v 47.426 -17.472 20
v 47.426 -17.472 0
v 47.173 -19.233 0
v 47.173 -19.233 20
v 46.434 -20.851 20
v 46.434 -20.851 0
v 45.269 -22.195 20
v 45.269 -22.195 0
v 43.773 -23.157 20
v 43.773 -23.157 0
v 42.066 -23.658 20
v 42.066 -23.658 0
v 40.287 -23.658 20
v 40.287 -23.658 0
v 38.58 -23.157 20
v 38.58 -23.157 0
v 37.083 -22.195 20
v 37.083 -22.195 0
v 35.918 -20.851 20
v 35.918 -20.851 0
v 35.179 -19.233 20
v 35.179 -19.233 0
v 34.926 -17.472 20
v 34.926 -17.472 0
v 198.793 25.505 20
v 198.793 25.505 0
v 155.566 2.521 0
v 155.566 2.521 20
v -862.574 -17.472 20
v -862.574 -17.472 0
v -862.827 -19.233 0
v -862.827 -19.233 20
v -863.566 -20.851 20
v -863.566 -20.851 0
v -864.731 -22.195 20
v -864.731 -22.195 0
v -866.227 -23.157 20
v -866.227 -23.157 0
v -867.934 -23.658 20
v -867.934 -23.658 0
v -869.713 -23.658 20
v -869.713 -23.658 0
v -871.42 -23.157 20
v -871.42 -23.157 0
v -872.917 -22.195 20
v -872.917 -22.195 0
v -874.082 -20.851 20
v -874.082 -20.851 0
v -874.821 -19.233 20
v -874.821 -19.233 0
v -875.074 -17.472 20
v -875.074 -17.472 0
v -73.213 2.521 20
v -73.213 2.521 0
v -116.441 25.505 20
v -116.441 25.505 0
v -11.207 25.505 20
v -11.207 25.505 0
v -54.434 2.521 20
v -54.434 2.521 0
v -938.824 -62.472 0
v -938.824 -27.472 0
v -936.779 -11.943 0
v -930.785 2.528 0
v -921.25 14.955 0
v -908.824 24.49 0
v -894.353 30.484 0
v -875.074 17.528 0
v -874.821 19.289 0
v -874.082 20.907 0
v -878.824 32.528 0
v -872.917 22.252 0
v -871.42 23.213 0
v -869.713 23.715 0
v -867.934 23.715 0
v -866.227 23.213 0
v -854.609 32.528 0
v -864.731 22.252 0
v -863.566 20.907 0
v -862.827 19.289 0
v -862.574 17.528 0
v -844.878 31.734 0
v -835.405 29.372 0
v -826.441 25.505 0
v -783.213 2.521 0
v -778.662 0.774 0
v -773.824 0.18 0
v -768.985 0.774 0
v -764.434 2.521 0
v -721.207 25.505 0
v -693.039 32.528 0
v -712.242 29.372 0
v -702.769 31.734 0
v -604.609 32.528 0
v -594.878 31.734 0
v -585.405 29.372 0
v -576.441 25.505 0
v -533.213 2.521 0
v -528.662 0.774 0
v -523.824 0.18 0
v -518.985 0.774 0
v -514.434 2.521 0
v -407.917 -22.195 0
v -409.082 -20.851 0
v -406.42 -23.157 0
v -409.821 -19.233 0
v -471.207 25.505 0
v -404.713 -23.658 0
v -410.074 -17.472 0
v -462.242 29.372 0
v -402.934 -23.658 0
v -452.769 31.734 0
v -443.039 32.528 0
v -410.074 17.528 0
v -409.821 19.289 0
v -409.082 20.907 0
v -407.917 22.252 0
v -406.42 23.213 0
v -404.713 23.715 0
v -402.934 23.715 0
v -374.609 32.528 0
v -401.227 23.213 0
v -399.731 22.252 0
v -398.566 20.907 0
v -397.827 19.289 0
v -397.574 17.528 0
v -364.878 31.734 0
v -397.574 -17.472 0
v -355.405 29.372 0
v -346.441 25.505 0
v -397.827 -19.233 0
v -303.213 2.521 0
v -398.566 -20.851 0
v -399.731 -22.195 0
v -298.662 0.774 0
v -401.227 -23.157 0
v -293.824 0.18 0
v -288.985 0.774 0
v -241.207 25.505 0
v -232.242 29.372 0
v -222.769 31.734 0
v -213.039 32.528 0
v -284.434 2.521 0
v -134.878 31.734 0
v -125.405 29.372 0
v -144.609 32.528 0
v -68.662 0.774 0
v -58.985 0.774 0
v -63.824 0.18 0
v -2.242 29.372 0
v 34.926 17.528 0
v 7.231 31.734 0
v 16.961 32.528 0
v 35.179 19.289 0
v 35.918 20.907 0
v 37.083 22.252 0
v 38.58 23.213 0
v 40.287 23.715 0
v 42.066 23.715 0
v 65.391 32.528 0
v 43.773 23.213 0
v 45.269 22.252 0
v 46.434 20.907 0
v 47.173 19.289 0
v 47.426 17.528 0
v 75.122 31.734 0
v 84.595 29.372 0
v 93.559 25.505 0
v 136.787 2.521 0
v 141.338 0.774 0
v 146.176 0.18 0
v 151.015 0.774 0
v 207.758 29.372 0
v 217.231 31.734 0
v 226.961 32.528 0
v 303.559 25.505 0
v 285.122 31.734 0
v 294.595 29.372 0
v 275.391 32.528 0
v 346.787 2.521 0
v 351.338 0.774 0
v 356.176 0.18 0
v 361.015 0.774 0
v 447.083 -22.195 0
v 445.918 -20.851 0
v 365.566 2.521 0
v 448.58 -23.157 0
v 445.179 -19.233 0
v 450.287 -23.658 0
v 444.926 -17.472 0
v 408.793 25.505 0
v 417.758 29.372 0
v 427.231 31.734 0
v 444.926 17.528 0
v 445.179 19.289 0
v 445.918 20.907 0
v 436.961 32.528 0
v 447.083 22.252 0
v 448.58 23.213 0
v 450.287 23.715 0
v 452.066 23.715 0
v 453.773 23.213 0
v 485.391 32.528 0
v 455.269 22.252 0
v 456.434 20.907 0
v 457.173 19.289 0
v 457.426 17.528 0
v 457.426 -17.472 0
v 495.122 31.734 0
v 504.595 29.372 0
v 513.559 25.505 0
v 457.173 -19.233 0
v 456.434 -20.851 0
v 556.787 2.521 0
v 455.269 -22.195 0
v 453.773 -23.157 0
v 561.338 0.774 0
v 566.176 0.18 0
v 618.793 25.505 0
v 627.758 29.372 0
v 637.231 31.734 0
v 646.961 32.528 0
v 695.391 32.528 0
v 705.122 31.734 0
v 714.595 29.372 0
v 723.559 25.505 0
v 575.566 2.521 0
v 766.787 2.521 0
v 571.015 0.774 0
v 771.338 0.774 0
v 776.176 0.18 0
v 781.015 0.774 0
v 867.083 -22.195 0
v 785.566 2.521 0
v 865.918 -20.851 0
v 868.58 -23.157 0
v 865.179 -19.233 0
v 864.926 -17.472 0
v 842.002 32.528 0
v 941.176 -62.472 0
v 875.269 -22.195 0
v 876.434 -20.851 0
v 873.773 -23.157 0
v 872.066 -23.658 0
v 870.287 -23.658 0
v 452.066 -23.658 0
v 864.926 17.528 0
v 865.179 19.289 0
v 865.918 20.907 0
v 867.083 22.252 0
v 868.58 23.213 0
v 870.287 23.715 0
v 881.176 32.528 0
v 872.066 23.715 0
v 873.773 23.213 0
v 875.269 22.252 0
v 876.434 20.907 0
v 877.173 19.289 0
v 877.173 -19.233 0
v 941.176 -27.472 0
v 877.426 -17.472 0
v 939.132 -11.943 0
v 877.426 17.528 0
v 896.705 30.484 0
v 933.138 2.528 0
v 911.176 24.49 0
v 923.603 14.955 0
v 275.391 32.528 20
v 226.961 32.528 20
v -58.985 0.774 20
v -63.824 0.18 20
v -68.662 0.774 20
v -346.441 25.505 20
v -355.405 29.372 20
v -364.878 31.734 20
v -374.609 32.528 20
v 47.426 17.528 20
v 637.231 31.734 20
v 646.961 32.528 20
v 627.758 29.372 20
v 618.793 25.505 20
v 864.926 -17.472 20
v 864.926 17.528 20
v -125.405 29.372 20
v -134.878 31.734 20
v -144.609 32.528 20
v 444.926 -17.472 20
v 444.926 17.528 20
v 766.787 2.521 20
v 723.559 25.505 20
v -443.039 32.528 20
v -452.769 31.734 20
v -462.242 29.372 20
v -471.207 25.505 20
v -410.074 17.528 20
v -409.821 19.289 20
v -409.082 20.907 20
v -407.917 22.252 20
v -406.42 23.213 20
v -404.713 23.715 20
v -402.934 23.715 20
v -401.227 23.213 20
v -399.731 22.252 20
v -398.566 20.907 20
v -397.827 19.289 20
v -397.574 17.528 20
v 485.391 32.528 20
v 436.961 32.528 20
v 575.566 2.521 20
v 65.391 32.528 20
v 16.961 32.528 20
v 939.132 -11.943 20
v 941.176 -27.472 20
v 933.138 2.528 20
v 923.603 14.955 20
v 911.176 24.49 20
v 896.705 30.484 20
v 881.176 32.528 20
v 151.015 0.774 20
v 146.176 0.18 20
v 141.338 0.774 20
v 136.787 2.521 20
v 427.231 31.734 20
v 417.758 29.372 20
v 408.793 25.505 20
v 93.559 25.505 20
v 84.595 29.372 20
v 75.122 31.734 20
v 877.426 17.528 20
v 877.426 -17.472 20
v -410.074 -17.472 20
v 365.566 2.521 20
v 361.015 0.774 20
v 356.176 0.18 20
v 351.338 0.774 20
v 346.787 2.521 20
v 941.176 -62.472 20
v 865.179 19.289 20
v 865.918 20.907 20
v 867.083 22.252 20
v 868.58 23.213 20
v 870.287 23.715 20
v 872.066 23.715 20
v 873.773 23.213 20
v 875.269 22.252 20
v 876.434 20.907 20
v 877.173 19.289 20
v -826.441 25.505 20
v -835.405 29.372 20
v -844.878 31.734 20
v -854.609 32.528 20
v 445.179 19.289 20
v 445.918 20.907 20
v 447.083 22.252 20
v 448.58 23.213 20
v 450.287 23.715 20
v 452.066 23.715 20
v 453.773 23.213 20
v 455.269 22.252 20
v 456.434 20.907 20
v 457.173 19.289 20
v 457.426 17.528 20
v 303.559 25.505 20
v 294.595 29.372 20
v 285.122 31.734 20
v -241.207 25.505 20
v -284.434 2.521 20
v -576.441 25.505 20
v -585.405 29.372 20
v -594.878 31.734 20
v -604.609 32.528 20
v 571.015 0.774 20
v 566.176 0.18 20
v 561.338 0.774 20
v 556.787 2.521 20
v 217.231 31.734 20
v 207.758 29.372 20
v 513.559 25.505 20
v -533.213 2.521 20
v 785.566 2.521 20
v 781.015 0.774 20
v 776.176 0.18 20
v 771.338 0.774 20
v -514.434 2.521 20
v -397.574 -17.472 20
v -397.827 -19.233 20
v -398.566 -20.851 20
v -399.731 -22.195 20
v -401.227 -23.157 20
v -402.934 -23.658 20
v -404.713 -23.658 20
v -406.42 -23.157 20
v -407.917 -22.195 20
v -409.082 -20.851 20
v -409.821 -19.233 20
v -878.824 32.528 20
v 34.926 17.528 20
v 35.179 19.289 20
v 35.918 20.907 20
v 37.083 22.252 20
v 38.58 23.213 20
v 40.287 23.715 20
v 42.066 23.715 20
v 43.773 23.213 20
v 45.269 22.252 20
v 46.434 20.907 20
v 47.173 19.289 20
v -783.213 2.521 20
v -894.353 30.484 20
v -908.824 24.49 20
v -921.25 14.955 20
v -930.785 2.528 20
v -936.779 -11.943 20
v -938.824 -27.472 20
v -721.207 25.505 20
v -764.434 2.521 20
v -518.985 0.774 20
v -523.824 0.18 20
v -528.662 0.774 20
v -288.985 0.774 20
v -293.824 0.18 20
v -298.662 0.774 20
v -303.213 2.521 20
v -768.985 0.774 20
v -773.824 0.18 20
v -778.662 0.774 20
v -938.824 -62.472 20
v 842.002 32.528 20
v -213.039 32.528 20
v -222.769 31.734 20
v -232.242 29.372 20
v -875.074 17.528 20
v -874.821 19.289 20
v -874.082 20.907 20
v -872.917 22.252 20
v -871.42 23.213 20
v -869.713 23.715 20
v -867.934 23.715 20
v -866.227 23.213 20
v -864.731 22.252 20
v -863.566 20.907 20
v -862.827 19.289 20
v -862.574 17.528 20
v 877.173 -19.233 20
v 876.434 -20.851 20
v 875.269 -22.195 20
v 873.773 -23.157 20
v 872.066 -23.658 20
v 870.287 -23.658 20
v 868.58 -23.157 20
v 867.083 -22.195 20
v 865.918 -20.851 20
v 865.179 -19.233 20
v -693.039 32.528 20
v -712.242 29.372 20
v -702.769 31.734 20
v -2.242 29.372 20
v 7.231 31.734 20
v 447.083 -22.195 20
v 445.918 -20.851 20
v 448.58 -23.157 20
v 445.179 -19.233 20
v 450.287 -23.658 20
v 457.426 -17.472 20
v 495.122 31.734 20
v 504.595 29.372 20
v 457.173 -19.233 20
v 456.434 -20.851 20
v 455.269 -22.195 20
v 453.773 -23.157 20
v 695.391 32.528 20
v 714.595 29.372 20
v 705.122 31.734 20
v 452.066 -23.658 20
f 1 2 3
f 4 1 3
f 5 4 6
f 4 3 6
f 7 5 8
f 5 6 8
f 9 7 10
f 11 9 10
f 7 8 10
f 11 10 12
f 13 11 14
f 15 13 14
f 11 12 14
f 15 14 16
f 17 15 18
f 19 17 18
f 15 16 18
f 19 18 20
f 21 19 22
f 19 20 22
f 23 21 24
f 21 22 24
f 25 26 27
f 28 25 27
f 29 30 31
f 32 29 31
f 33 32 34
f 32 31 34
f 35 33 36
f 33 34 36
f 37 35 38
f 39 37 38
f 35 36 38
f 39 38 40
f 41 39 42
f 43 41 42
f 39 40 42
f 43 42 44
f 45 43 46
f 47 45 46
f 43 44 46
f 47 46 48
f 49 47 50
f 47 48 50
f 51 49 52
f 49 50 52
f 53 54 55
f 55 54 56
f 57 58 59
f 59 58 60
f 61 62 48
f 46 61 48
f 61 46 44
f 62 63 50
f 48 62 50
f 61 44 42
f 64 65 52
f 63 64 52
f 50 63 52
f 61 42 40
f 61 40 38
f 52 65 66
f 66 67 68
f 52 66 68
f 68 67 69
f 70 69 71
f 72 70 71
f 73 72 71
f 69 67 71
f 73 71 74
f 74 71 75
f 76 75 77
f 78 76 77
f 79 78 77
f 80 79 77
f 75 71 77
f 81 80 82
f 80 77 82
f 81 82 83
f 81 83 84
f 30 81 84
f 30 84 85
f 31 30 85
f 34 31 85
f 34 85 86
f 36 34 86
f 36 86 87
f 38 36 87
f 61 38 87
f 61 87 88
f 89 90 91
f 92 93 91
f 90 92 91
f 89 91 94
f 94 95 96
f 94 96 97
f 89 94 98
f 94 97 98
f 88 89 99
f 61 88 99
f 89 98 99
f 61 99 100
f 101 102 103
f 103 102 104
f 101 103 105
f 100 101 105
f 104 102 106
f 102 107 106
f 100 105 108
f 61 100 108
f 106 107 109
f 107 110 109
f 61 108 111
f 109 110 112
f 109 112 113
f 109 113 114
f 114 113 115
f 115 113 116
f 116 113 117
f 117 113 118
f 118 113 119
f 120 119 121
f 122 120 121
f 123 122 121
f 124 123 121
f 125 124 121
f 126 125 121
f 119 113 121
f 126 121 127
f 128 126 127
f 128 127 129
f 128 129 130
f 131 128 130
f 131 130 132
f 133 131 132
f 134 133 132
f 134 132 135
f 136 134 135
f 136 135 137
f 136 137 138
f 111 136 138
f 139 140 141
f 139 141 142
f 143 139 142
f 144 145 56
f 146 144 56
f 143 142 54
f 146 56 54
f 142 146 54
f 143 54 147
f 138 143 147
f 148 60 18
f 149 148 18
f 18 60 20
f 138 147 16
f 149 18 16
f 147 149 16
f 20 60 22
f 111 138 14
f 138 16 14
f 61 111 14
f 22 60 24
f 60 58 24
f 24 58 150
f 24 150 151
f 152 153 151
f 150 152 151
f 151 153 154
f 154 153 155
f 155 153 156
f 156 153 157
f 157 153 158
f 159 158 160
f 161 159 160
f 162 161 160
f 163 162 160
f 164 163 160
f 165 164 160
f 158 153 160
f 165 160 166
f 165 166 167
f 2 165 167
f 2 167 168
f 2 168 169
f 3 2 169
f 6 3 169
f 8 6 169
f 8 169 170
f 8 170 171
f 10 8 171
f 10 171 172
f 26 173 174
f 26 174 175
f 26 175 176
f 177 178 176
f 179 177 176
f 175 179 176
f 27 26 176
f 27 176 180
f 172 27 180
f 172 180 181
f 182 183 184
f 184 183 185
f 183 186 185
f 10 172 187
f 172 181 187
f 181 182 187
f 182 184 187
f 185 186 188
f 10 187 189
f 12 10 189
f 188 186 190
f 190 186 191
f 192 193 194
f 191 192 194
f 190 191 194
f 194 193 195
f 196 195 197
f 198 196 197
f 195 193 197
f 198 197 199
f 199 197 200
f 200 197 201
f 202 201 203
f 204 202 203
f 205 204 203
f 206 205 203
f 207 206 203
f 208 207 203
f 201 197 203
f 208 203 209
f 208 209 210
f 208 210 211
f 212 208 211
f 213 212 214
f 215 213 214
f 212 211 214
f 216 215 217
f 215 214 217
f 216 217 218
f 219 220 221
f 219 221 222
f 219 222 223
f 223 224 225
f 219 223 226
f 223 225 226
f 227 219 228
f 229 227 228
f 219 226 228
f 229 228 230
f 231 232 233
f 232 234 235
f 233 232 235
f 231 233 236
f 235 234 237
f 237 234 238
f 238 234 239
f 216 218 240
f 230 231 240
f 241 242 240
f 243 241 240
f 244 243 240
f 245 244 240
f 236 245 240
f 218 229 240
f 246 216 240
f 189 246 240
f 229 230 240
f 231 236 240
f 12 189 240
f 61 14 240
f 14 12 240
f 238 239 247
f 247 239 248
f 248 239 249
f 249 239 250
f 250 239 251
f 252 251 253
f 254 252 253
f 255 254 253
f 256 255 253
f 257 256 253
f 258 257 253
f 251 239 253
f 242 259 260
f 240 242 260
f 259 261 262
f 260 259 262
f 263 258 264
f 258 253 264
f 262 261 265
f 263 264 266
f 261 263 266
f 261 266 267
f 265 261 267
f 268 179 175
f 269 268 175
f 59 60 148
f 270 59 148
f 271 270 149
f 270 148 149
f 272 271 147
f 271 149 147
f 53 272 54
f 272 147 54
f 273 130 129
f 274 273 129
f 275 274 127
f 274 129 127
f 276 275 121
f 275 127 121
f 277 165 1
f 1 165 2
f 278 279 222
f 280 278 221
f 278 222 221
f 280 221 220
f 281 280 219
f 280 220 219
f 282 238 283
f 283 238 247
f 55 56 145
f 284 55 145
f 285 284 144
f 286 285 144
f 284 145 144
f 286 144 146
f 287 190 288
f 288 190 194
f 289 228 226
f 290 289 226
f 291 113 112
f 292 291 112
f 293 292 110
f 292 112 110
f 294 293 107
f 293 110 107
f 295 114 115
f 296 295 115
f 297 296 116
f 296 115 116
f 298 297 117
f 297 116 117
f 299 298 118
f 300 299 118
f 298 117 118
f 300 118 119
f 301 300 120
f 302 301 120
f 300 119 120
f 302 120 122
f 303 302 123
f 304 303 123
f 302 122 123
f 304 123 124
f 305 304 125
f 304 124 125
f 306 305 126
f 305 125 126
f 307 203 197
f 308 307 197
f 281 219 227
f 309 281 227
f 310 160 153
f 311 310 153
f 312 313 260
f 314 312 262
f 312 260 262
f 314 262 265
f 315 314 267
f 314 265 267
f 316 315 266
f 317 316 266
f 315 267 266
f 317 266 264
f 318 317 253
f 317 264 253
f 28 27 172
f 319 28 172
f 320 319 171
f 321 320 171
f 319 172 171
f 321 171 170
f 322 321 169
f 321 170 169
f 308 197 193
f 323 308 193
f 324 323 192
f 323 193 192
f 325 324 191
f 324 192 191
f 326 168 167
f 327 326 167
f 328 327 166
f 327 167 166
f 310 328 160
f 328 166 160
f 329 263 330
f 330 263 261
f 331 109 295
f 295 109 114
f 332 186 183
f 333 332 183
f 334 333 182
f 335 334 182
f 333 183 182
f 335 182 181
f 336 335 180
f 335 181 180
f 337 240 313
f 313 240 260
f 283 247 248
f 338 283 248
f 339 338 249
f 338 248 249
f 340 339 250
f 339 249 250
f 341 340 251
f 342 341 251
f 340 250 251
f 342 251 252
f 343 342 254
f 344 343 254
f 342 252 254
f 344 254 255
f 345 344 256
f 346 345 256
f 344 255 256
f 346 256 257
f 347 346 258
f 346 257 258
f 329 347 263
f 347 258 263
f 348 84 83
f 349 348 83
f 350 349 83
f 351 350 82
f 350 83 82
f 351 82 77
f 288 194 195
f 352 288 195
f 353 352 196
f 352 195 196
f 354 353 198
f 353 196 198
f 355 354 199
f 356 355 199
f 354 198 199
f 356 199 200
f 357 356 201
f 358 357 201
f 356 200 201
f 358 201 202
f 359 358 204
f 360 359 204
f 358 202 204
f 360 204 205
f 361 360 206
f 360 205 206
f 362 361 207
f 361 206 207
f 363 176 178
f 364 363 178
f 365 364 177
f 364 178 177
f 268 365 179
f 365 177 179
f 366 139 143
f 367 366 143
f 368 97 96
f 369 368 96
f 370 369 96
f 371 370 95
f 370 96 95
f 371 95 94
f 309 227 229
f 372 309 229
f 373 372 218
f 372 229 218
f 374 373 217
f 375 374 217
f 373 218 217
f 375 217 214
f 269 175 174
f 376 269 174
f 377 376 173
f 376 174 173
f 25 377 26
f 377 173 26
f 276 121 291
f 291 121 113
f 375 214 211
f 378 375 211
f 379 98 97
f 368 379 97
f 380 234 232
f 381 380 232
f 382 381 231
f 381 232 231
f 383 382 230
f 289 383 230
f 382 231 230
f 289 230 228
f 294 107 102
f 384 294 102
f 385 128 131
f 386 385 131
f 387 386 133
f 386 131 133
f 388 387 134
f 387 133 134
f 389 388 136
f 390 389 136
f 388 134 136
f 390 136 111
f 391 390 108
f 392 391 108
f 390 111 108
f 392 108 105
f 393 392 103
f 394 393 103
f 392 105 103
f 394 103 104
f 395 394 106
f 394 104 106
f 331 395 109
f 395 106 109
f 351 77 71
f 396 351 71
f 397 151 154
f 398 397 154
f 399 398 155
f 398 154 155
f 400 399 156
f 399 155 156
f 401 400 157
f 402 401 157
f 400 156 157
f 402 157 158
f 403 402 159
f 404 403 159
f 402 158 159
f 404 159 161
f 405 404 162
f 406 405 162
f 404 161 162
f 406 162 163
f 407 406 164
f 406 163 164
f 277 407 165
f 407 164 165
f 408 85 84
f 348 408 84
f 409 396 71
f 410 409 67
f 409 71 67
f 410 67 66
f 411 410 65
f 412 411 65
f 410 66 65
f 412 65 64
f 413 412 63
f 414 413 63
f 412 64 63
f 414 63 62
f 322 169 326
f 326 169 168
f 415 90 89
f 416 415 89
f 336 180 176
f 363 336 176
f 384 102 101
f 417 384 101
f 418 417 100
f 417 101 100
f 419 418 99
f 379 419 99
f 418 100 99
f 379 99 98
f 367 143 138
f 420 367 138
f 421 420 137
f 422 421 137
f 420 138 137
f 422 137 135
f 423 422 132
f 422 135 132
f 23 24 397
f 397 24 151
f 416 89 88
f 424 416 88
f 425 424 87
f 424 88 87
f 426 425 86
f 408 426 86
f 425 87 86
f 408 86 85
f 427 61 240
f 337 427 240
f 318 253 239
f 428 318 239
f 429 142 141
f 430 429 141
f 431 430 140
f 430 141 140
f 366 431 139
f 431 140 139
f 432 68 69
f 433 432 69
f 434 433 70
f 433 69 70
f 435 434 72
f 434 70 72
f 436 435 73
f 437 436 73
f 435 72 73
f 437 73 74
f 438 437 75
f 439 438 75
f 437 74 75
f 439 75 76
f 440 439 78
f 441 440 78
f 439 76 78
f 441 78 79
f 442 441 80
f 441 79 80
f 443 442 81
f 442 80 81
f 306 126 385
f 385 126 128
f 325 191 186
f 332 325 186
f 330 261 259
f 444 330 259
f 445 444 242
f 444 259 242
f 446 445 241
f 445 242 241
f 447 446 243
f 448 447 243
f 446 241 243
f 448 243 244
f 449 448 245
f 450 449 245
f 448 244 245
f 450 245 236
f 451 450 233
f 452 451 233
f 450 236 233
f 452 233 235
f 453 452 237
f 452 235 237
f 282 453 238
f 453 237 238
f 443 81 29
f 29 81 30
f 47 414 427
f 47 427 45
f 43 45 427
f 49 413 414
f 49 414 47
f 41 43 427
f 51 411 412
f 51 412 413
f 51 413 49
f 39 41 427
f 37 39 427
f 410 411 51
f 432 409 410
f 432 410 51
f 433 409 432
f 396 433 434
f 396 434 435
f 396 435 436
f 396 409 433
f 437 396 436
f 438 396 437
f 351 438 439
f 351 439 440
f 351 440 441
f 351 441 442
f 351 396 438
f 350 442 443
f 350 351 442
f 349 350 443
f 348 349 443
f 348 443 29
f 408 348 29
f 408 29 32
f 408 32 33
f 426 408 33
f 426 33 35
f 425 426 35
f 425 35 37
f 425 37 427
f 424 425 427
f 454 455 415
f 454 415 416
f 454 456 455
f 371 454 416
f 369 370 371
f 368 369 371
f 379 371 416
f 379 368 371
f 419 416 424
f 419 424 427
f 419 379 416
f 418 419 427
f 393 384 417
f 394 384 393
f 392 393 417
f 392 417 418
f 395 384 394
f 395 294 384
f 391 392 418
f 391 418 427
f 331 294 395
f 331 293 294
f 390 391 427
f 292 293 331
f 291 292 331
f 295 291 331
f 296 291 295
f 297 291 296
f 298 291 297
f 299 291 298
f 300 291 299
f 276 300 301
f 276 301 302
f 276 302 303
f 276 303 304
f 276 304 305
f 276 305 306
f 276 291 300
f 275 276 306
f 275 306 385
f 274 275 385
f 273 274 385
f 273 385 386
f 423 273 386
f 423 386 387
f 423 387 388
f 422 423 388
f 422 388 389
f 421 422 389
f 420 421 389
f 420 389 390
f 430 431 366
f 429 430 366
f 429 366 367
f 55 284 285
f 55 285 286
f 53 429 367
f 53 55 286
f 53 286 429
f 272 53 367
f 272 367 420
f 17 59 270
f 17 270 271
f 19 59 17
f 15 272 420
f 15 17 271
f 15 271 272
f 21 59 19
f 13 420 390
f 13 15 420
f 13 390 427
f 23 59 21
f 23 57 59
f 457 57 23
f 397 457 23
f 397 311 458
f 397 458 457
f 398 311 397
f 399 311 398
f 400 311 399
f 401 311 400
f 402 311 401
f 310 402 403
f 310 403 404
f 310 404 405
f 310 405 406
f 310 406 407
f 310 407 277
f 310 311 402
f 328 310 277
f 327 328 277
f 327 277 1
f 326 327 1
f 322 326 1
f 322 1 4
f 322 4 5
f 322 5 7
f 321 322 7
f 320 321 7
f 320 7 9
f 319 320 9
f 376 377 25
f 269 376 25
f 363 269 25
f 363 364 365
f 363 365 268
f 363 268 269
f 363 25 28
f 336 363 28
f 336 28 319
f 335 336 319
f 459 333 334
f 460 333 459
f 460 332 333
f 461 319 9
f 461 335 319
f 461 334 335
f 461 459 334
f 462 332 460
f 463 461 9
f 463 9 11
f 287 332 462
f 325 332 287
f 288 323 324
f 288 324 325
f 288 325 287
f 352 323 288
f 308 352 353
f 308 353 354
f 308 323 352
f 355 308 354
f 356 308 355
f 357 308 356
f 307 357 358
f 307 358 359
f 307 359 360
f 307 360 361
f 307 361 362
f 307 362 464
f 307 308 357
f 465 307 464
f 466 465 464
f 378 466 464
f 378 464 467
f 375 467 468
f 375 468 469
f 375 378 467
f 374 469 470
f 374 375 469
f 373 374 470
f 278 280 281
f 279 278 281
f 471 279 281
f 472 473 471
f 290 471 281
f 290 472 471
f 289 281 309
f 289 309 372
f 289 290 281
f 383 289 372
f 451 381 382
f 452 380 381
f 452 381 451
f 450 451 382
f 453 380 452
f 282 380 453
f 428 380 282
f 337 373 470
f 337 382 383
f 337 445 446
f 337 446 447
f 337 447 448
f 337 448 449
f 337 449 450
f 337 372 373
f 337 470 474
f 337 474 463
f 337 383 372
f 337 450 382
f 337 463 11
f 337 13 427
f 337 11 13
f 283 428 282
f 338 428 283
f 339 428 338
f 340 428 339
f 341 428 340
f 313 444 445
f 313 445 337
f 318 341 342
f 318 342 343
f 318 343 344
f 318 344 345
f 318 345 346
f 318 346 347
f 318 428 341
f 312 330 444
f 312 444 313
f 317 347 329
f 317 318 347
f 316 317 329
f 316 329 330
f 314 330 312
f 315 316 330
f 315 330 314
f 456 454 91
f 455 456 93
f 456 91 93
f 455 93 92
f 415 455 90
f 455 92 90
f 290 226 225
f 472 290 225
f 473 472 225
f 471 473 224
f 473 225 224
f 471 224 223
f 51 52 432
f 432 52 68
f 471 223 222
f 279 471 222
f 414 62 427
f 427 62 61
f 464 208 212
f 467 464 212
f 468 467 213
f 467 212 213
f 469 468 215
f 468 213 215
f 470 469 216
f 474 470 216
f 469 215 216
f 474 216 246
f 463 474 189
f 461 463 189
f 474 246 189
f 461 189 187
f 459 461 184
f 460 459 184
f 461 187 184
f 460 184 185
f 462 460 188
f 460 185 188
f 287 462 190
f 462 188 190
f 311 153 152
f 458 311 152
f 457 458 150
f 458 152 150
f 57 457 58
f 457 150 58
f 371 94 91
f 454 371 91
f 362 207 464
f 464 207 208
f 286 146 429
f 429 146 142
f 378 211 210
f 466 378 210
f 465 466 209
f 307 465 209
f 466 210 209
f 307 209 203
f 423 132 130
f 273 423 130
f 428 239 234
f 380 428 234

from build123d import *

# Parameters (mm, degrees)
RESSALTO_EXTRUS_O1_DEPTH = 20


with BuildPart() as part:
    # Esboço1 → Ressalto-extrusão1 (new body)
    # profile 1 of 2: a face of its own
    with BuildSketch(Plane.XY):
        with BuildLine():
            Line((-938.823833844, -27.471849847), (-938.823833844, -32.471849847))
            Line((-938.823833844, -32.471849847), (-936.823833844, -32.471849847))
            Line((-936.823833844, -32.471849847), (941.176166156, -32.471849847))
            Line((941.176166156, -32.471849847), (941.176166156, -27.471849847))
            ThreePointArc((941.176166156, -27.471849847), (923.602573027, 14.954557024), (881.176166156, 32.528150153))
            Line((881.176166156, 32.528150153), (846.261701379, 32.528150153))
            Line((846.261701379, 32.528150153), (842.001592443, 32.528150153))
            Line((842.001592443, 32.528150153), (785.565597412, 2.52059931))
            ThreePointArc((785.565597412, 2.52059931), (776.176166156, 0.179551167), (766.7867349, 2.52059931))
            Line((766.7867349, 2.52059931), (723.559353465, 25.505005725))
            ThreePointArc((723.559353465, 25.505005725), (709.906373434, 30.74589373), (695.391059698, 32.528150153))
            Line((695.391059698, 32.528150153), (646.961272614, 32.528150153))
            ThreePointArc((646.961272614, 32.528150153), (632.445958878, 30.74589373), (618.792978847, 25.505005725))
            Line((618.792978847, 25.505005725), (575.565597412, 2.52059931))
            ThreePointArc((575.565597412, 2.52059931), (566.176166156, 0.179551167), (556.7867349, 2.52059931))
            Line((556.7867349, 2.52059931), (513.559353465, 25.505005725))
            ThreePointArc((513.559353465, 25.505005725), (499.906373434, 30.74589373), (485.391059698, 32.528150153))
            Line((485.391059698, 32.528150153), (436.961272614, 32.528150153))
            ThreePointArc((436.961272614, 32.528150153), (422.445958878, 30.74589373), (408.792978847, 25.505005725))
            Line((408.792978847, 25.505005725), (365.565597412, 2.52059931))
            ThreePointArc((365.565597412, 2.52059931), (356.176166156, 0.179551167), (346.7867349, 2.52059931))
            Line((346.7867349, 2.52059931), (303.559353465, 25.505005725))
            ThreePointArc((303.559353465, 25.505005725), (289.906373434, 30.74589373), (275.391059698, 32.528150153))
            Line((275.391059698, 32.528150153), (226.961272614, 32.528150153))
            ThreePointArc((226.961272614, 32.528150153), (212.445958878, 30.74589373), (198.792978847, 25.505005725))
            Line((198.792978847, 25.505005725), (155.565597412, 2.52059931))
            ThreePointArc((155.565597412, 2.52059931), (146.176166156, 0.179551167), (136.7867349, 2.52059931))
            Line((136.7867349, 2.52059931), (93.559353465, 25.505005725))
            ThreePointArc((93.559353465, 25.505005725), (79.906373434, 30.74589373), (65.391059698, 32.528150153))
            Line((65.391059698, 32.528150153), (16.961272614, 32.528150153))
            ThreePointArc((16.961272614, 32.528150153), (2.445958878, 30.74589373), (-11.207021153, 25.505005725))
            Line((-11.207021153, 25.505005725), (-54.434402588, 2.52059931))
            ThreePointArc((-54.434402588, 2.52059931), (-63.823833844, 0.179551167), (-73.2132651, 2.52059931))
            Line((-73.2132651, 2.52059931), (-116.440646535, 25.505005725))
            ThreePointArc((-116.440646535, 25.505005725), (-130.093626566, 30.74589373), (-144.608940302, 32.528150153))
            Line((-144.608940302, 32.528150153), (-213.038727386, 32.528150153))
            ThreePointArc((-213.038727386, 32.528150153), (-227.554041122, 30.74589373), (-241.207021153, 25.505005725))
            Line((-241.207021153, 25.505005725), (-284.434402588, 2.52059931))
            ThreePointArc((-284.434402588, 2.52059931), (-293.823833844, 0.179551167), (-303.2132651, 2.52059931))
            Line((-303.2132651, 2.52059931), (-346.440646535, 25.505005725))
            ThreePointArc((-346.440646535, 25.505005725), (-360.093626566, 30.74589373), (-374.608940302, 32.528150153))
            Line((-374.608940302, 32.528150153), (-443.038727386, 32.528150153))
            ThreePointArc((-443.038727386, 32.528150153), (-457.554041122, 30.74589373), (-471.207021153, 25.505005725))
            Line((-471.207021153, 25.505005725), (-514.434402588, 2.52059931))
            ThreePointArc((-514.434402588, 2.52059931), (-523.823833844, 0.179551167), (-533.2132651, 2.52059931))
            Line((-533.2132651, 2.52059931), (-576.440646535, 25.505005725))
            ThreePointArc((-576.440646535, 25.505005725), (-590.093626566, 30.74589373), (-604.608940302, 32.528150153))
            Line((-604.608940302, 32.528150153), (-693.038727386, 32.528150153))
            ThreePointArc((-693.038727386, 32.528150153), (-707.554041122, 30.74589373), (-721.207021153, 25.505005725))
            Line((-721.207021153, 25.505005725), (-764.434402588, 2.52059931))
            ThreePointArc((-764.434402588, 2.52059931), (-773.823833844, 0.179551167), (-783.2132651, 2.52059931))
            Line((-783.2132651, 2.52059931), (-826.440646535, 25.505005725))
            ThreePointArc((-826.440646535, 25.505005725), (-840.093626566, 30.74589373), (-854.608940302, 32.528150153))
            Line((-854.608940302, 32.528150153), (-878.823833844, 32.528150153))
            ThreePointArc((-878.823833844, 32.528150153), (-921.250240715, 14.954557024), (-938.823833844, -27.471849847))
        make_face()
        with BuildLine():
            ThreePointArc((-875.073833844, 17.528150153), (-868.823833844, 23.778150153), (-862.573833844, 17.528150153))
            Line((-862.573833844, 17.528150153), (-862.573833844, -17.471849847))
            ThreePointArc((-862.573833844, -17.471849847), (-868.823833844, -23.721849847), (-875.073833844, -17.471849847))
            Line((-875.073833844, -17.471849847), (-875.073833844, 17.528150153))
        make_face(mode=Mode.SUBTRACT)
        with BuildLine():
            ThreePointArc((-410.073833844, 17.528150153), (-403.823833844, 23.778150153), (-397.573833844, 17.528150153))
            Line((-397.573833844, 17.528150153), (-397.573833844, -17.471849847))
            ThreePointArc((-397.573833844, -17.471849847), (-403.823833844, -23.721849847), (-410.073833844, -17.471849847))
            Line((-410.073833844, -17.471849847), (-410.073833844, 17.528150153))
        make_face(mode=Mode.SUBTRACT)
        with BuildLine():
            ThreePointArc((47.426166156, -17.471849847), (41.176166156, -23.721849847), (34.926166156, -17.471849847))
            Line((34.926166156, -17.471849847), (34.926166156, 17.528150153))
            ThreePointArc((34.926166156, 17.528150153), (41.176166156, 23.778150153), (47.426166156, 17.528150153))
            Line((47.426166156, 17.528150153), (47.426166156, -17.471849847))
        make_face(mode=Mode.SUBTRACT)
        with BuildLine():
            ThreePointArc((444.926166156, 17.528150153), (451.176166156, 23.778150153), (457.426166156, 17.528150153))
            Line((457.426166156, 17.528150153), (457.426166156, -17.471849847))
            ThreePointArc((457.426166156, -17.471849847), (451.176166156, -23.721849847), (444.926166156, -17.471849847))
            Line((444.926166156, -17.471849847), (444.926166156, 17.528150153))
        make_face(mode=Mode.SUBTRACT)
        with BuildLine():
            ThreePointArc((877.426166156, -17.471849847), (871.176166156, -23.721849847), (864.926166156, -17.471849847))
            Line((864.926166156, -17.471849847), (864.926166156, 17.528150153))
            ThreePointArc((864.926166156, 17.528150153), (871.176166156, 23.778150153), (877.426166156, 17.528150153))
            Line((877.426166156, 17.528150153), (877.426166156, -17.471849847))
        make_face(mode=Mode.SUBTRACT)
    # profile 2 of 2: a face of its own
    with BuildSketch(Plane.XY):
        Polygon((-936.823833844, -32.471849847), (-938.823833844, -32.471849847), (-938.823833844, -62.471849847), (941.176166156, -62.471849847), (941.176166156, -32.471849847), align=None)
    extrude(amount=RESSALTO_EXTRUS_O1_DEPTH)


solid = part.part
